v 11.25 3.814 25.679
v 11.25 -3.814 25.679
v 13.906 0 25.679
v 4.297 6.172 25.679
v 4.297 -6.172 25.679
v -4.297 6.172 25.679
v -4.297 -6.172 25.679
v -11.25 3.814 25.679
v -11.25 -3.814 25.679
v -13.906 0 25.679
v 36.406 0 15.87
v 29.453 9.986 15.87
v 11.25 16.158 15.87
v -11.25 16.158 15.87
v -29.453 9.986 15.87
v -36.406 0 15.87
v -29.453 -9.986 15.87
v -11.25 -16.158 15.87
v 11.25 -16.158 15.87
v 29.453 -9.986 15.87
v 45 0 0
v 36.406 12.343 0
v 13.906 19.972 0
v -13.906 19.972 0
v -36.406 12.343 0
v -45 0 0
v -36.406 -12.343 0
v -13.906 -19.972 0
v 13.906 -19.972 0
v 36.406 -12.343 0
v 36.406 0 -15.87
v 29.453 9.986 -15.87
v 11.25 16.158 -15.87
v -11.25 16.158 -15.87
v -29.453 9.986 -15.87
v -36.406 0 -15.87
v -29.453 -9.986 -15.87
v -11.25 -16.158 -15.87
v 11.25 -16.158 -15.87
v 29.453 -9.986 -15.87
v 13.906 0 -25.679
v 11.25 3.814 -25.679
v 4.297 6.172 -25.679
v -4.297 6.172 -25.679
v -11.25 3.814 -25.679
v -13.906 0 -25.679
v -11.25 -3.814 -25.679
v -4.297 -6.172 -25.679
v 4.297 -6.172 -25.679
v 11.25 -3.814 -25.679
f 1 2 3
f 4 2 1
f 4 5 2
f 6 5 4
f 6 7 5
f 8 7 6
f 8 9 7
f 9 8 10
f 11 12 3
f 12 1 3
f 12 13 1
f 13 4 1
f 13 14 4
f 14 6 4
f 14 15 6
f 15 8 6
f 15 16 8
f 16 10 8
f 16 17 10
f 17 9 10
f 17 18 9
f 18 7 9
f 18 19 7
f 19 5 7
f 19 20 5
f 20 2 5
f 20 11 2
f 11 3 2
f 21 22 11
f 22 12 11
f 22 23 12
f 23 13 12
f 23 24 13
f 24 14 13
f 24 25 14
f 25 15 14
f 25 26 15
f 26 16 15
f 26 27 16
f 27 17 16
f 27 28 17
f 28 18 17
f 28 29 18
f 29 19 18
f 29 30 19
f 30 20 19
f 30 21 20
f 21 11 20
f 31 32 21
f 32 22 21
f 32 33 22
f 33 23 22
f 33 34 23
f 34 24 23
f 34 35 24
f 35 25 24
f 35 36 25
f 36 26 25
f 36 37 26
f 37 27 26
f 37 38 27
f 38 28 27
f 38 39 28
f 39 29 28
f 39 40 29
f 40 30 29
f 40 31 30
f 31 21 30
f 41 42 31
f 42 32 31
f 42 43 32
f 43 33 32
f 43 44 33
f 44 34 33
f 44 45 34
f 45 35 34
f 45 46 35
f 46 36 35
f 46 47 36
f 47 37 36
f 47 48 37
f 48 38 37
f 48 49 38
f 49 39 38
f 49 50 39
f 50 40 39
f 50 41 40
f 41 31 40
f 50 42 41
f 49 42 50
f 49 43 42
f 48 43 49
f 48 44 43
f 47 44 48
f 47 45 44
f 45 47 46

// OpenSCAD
// Generated by SolidPython 1.0.1 on 2020-07-29 00:46:51


scale(v = [15, 7, 9]) {
	sphere(r = 3);
}
/***********************************************
*********      SolidPython code:      **********
************************************************
 
# import packages: SolidPython
from solid import *
from solid.utils import *
from itertools import chain, combinations, permutations


class Resize:

    def __init__(self, scad_file):
        self.scad_file = scad_file
        #self.scad_file = import_scad(scad_file)
        # cone/cylinder param:
        self.r1 = 0
        self.r2 = 0
        self.h = 0
        # rectangular prism param:
        self.w = 0
        self.l = 0
        # ellipse param:
        self.r = 0

    # import OpenScad code (file name corresponds to shape)


    # classify shape + parameters
    def assign(self, param1, param2, param3):
        if self.scad_file == 'cone.scad':
            self.r1 = param1
            self.r2 = param2
            self.h = param3
        elif self.scad_file == 'cylinder.scad':
            self.r1 = param1
            self.r2 = param2
            self.h = param3
        elif self.scad_file == 'rectangularPrism.scad':
            self.h = param1
            self.l = param2
            self.w = param3
        else:
            self.r = param1
            self.h = param2

    # resize parameters
    def iterate(self):
        x = range(3, 20, 2)
        i = 1
        if self.scad_file == 'cone.scad':
            tempList = list(permutations(x, 2))
            for temp in tempList:
                param1 = temp[0]
                param2 = temp[1]
                filepath = 'produced_scad_files/' + 'cone' + str(param1) + '_' + str(param2) + '_' + '.scad'
                scad_render_to_file(cylinder(h=param1, r1=param2, r2=0), filepath)

        elif self.scad_file == 'cylinder.scad':
            tempList = list(permutations(x, 3))
            for temp in tempList:
                param1 = temp[0]
                param2 = temp[1]
                filepath = 'produced_scad_files/' + 'cylinder' + str(param1) + '_' + str(param2) + '_' + '.scad'
                scad_render_to_file(cylinder(h=param1, r1=param2, r2=param2), filepath)

        elif self.scad_file == 'rectangularPrism.scad':
            tempList = list(permutations(x, 3))
            for temp in tempList:
                param1 = temp[0]
                param2 = temp[1]
                param3 = temp[2]
                filepath = 'produced_scad_files/' + 'rectangularPrism' + str(param1) + '_' + str(param2) + '_' + str(
                    param3) + '.scad'
                scad_render_to_file(cube(size=(param1, param2, param3)), filepath)

        elif self.scad_file == 'ellipse.scad':
            tempList = list(permutations(x, 4))
            for temp in tempList:
                param1 = temp[0]
                param2 = temp[1]
                param3 = temp[2]
                param4 = temp[3]
                filepath = 'produced_scad_files/' + 'ellipse' + str(param1) + '_' + str(param2) + '_' + str(param3) + '_' + str(param4) + '.scad'
                scad_render_to_file(scale([param1, param2, param3])(sphere(r=param4)), filepath)

    def render_to_scadfile(self):
        scad_render_to_file(scad, 'example.scad') 
 
************************************************/
